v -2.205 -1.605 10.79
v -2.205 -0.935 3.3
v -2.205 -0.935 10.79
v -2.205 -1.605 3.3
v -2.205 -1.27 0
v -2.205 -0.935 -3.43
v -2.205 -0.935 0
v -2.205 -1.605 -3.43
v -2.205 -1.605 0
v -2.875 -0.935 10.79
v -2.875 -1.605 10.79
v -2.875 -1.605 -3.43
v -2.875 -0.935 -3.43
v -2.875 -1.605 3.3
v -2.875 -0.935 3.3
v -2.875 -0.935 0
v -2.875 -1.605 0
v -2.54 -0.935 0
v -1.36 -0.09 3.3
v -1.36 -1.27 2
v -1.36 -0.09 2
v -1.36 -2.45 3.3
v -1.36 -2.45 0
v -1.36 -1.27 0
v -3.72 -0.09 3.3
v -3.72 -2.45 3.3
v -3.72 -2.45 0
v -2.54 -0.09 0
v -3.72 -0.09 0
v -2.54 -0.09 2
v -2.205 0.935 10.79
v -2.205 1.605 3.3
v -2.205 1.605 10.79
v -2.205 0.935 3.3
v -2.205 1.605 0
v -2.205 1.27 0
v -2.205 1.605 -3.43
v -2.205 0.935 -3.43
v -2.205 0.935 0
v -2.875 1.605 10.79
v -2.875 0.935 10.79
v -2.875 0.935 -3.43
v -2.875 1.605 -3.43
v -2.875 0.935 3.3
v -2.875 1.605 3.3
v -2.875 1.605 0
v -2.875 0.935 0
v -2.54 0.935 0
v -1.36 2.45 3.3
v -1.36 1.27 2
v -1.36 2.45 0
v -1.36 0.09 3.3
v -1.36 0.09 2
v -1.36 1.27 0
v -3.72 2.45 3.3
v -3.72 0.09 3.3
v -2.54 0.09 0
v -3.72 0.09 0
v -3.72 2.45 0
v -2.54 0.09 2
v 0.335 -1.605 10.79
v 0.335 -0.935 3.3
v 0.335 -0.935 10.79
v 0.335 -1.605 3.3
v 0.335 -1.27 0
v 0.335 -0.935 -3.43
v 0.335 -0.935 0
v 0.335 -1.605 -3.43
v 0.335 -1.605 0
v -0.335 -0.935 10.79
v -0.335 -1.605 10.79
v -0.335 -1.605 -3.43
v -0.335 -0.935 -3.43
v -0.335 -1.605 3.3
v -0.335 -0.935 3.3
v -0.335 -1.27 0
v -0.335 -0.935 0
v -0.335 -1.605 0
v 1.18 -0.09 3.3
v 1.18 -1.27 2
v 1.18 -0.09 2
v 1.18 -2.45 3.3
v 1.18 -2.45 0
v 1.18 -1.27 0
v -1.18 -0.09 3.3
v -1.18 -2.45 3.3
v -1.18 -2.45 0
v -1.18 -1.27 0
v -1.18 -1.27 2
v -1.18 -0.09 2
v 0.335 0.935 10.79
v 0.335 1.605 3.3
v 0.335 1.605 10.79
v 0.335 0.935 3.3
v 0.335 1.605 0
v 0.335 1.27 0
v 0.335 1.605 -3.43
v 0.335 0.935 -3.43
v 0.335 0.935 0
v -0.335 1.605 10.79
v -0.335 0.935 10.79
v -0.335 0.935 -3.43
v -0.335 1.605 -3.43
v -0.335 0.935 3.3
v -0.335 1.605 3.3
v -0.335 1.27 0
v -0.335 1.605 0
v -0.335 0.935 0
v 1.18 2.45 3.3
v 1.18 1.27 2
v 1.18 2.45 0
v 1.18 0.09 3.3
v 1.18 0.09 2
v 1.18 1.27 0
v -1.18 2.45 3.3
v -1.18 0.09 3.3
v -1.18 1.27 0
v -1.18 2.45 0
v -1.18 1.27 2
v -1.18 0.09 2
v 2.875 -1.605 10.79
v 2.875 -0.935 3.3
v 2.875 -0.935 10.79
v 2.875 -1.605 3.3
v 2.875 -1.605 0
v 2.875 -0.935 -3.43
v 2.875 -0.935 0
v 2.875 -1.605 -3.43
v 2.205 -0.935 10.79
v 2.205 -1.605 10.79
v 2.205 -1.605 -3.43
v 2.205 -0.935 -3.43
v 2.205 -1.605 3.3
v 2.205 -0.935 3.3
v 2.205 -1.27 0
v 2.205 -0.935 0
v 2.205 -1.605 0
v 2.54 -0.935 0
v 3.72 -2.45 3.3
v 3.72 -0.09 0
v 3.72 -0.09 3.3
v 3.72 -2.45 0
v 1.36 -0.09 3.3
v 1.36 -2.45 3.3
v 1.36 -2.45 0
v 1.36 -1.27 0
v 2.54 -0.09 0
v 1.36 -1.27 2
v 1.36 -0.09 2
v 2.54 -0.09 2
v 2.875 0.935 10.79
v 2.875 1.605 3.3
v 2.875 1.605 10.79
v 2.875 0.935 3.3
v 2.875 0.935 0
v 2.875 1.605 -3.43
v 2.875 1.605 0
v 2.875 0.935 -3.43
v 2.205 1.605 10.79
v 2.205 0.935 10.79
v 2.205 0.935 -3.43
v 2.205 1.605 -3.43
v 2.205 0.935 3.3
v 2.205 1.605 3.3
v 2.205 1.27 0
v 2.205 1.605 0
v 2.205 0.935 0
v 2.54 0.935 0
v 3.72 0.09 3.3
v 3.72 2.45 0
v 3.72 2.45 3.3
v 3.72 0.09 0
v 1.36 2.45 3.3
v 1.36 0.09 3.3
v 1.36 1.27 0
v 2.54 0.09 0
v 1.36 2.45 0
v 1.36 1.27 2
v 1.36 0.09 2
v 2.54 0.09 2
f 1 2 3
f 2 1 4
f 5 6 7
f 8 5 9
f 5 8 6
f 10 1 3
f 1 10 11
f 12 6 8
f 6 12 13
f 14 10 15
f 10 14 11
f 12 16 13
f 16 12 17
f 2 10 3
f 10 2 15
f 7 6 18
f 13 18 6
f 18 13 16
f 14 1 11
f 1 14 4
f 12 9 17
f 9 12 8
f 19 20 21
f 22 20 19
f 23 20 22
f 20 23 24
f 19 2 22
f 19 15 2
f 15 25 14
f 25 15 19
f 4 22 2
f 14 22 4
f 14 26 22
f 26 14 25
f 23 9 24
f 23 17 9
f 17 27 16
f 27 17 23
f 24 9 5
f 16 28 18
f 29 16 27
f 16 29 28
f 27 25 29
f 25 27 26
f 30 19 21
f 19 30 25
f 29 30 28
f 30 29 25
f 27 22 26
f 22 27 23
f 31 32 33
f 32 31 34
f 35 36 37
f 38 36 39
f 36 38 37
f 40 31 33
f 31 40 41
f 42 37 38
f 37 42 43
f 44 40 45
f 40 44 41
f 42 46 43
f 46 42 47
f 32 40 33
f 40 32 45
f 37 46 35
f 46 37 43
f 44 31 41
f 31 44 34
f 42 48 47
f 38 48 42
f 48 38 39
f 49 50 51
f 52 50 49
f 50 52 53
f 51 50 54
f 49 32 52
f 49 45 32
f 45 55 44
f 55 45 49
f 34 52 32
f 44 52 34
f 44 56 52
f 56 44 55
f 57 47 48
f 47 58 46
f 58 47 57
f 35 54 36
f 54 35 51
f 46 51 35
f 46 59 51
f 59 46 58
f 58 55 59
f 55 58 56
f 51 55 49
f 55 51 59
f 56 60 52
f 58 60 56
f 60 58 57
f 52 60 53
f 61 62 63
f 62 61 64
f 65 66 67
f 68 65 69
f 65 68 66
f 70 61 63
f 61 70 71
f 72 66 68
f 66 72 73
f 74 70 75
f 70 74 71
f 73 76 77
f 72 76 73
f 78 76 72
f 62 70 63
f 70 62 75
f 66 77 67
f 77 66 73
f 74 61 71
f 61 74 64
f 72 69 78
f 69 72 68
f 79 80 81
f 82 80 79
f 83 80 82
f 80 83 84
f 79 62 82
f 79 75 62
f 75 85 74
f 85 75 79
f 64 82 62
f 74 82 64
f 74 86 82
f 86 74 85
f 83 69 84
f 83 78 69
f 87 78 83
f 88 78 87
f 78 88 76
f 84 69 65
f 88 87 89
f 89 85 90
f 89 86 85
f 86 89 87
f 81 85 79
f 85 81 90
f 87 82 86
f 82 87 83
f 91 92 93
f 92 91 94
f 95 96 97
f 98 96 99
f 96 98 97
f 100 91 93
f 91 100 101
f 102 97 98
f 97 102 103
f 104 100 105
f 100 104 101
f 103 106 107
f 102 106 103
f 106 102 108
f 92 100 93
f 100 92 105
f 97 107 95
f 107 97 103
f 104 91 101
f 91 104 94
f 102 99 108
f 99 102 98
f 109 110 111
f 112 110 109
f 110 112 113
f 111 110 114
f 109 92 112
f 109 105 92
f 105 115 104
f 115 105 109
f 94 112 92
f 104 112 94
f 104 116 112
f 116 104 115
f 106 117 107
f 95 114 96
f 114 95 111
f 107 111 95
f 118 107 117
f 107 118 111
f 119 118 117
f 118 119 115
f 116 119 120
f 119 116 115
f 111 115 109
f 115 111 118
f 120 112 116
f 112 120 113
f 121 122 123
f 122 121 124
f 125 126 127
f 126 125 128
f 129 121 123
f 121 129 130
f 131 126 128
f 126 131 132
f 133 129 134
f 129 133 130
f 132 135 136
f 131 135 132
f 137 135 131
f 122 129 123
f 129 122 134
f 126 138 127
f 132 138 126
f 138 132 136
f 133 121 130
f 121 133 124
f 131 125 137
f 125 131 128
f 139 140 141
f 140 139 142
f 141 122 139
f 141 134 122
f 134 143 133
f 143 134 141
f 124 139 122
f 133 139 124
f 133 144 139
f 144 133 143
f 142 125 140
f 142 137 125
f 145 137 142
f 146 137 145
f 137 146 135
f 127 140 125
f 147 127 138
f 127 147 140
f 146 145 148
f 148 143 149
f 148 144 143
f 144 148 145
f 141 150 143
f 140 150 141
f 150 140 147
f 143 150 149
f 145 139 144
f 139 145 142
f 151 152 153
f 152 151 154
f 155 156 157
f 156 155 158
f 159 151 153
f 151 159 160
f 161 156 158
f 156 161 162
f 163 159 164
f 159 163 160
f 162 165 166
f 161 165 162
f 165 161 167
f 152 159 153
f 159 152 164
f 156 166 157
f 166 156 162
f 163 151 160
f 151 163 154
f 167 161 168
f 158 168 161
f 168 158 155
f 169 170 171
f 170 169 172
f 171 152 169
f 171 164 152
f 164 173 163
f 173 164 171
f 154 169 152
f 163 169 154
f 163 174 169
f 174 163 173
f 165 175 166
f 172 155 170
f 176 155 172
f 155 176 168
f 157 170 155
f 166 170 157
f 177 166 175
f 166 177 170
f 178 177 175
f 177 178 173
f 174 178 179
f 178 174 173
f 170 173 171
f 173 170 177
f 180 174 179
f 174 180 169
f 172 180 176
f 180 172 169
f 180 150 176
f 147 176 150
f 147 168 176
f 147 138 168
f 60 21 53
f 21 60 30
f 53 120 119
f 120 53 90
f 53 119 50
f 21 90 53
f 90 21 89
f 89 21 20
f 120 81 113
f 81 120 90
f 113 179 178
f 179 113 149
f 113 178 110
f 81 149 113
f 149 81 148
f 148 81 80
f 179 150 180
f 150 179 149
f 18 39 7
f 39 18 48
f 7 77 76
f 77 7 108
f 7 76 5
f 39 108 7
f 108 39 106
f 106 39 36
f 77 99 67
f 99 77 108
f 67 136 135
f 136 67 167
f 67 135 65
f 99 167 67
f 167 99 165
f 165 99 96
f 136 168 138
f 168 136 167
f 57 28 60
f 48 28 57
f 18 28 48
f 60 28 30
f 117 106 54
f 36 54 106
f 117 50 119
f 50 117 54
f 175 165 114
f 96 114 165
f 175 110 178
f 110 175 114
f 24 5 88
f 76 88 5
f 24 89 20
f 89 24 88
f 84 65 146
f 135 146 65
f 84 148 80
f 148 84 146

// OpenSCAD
/*
  Breakaway Header Pins: pitch 2.54, adjustable
  Aaron Ciuffo
  December 23 2015
  GPL V3

  
  Usage (default values shown): 
  ```
  use </path/to/libraries/header_pins.scad>
  //full
  headerPins(columns = 3, rows = 2, centerV = false, center = true, pitch = 2.52);
  //simple
  headerPins(3, 2);
  ```
  columns = integer number of columns (X axis)
  rows = integer number of rows (Y axis)
  centerV = vertically center around base - fale places bottom at origin
  center = center the array at the origin
  pitch = distance between center of each pin

  Note: 
  * the breakaway connector is a bit of a fudge and does not appear at the same
    Z height for centered/versus non centered; this should be largely irrelevant 

*/

/*[Dimensions]*/
//Columns
columns = 3; //[1:30]
//Rows
rows = 2; //[1:5]
//Pitch
pitch = 2.54; //[1.25, 1.27, 2, 2.54, 3.5, 3.96]

module singlePin(center = false) {
  pinDimensions = [.67, .67, 14.22];
  nylonDimensions = [2.36, 2.36, 3.3];
  pinAboveNylon = 7.49;

  trans = center == false ? [0, 0, nylonDimensions[2]/2] : [0, 0, 0];

  translate(trans)
  union() {
    translate([0, 0, (-pinDimensions[2]/2+nylonDimensions[2]/2)+pinAboveNylon])
      color("gold")
      cube(pinDimensions, center = true);    
    color("darkgray")
      cube(nylonDimensions, center =true);
  }
}

module headerPins(columns = 3, rows = 2, centerV = false, center = true, pitch = 2.54) {
  transV = centerV == false ? pitch/2 : 0; // vertical center

  trans = center == false ? [0, 0, 0] : [-(columns-1)*pitch/2, -(rows-1)*pitch/2, 0];

  echo (trans);
  translate(trans) 
  union() {
    for (i = [0:columns-1]) {
      for (j = [0:rows-1]) {
        translate([pitch*i, pitch*j, 0])
          singlePin();
      }
    }
    translate([0, 0, -pitch/2+transV])
      color("black")
      cube([pitch*(columns-1), pitch*(rows-1), 2]);
  }
}

//singlePin();
headerPins();
